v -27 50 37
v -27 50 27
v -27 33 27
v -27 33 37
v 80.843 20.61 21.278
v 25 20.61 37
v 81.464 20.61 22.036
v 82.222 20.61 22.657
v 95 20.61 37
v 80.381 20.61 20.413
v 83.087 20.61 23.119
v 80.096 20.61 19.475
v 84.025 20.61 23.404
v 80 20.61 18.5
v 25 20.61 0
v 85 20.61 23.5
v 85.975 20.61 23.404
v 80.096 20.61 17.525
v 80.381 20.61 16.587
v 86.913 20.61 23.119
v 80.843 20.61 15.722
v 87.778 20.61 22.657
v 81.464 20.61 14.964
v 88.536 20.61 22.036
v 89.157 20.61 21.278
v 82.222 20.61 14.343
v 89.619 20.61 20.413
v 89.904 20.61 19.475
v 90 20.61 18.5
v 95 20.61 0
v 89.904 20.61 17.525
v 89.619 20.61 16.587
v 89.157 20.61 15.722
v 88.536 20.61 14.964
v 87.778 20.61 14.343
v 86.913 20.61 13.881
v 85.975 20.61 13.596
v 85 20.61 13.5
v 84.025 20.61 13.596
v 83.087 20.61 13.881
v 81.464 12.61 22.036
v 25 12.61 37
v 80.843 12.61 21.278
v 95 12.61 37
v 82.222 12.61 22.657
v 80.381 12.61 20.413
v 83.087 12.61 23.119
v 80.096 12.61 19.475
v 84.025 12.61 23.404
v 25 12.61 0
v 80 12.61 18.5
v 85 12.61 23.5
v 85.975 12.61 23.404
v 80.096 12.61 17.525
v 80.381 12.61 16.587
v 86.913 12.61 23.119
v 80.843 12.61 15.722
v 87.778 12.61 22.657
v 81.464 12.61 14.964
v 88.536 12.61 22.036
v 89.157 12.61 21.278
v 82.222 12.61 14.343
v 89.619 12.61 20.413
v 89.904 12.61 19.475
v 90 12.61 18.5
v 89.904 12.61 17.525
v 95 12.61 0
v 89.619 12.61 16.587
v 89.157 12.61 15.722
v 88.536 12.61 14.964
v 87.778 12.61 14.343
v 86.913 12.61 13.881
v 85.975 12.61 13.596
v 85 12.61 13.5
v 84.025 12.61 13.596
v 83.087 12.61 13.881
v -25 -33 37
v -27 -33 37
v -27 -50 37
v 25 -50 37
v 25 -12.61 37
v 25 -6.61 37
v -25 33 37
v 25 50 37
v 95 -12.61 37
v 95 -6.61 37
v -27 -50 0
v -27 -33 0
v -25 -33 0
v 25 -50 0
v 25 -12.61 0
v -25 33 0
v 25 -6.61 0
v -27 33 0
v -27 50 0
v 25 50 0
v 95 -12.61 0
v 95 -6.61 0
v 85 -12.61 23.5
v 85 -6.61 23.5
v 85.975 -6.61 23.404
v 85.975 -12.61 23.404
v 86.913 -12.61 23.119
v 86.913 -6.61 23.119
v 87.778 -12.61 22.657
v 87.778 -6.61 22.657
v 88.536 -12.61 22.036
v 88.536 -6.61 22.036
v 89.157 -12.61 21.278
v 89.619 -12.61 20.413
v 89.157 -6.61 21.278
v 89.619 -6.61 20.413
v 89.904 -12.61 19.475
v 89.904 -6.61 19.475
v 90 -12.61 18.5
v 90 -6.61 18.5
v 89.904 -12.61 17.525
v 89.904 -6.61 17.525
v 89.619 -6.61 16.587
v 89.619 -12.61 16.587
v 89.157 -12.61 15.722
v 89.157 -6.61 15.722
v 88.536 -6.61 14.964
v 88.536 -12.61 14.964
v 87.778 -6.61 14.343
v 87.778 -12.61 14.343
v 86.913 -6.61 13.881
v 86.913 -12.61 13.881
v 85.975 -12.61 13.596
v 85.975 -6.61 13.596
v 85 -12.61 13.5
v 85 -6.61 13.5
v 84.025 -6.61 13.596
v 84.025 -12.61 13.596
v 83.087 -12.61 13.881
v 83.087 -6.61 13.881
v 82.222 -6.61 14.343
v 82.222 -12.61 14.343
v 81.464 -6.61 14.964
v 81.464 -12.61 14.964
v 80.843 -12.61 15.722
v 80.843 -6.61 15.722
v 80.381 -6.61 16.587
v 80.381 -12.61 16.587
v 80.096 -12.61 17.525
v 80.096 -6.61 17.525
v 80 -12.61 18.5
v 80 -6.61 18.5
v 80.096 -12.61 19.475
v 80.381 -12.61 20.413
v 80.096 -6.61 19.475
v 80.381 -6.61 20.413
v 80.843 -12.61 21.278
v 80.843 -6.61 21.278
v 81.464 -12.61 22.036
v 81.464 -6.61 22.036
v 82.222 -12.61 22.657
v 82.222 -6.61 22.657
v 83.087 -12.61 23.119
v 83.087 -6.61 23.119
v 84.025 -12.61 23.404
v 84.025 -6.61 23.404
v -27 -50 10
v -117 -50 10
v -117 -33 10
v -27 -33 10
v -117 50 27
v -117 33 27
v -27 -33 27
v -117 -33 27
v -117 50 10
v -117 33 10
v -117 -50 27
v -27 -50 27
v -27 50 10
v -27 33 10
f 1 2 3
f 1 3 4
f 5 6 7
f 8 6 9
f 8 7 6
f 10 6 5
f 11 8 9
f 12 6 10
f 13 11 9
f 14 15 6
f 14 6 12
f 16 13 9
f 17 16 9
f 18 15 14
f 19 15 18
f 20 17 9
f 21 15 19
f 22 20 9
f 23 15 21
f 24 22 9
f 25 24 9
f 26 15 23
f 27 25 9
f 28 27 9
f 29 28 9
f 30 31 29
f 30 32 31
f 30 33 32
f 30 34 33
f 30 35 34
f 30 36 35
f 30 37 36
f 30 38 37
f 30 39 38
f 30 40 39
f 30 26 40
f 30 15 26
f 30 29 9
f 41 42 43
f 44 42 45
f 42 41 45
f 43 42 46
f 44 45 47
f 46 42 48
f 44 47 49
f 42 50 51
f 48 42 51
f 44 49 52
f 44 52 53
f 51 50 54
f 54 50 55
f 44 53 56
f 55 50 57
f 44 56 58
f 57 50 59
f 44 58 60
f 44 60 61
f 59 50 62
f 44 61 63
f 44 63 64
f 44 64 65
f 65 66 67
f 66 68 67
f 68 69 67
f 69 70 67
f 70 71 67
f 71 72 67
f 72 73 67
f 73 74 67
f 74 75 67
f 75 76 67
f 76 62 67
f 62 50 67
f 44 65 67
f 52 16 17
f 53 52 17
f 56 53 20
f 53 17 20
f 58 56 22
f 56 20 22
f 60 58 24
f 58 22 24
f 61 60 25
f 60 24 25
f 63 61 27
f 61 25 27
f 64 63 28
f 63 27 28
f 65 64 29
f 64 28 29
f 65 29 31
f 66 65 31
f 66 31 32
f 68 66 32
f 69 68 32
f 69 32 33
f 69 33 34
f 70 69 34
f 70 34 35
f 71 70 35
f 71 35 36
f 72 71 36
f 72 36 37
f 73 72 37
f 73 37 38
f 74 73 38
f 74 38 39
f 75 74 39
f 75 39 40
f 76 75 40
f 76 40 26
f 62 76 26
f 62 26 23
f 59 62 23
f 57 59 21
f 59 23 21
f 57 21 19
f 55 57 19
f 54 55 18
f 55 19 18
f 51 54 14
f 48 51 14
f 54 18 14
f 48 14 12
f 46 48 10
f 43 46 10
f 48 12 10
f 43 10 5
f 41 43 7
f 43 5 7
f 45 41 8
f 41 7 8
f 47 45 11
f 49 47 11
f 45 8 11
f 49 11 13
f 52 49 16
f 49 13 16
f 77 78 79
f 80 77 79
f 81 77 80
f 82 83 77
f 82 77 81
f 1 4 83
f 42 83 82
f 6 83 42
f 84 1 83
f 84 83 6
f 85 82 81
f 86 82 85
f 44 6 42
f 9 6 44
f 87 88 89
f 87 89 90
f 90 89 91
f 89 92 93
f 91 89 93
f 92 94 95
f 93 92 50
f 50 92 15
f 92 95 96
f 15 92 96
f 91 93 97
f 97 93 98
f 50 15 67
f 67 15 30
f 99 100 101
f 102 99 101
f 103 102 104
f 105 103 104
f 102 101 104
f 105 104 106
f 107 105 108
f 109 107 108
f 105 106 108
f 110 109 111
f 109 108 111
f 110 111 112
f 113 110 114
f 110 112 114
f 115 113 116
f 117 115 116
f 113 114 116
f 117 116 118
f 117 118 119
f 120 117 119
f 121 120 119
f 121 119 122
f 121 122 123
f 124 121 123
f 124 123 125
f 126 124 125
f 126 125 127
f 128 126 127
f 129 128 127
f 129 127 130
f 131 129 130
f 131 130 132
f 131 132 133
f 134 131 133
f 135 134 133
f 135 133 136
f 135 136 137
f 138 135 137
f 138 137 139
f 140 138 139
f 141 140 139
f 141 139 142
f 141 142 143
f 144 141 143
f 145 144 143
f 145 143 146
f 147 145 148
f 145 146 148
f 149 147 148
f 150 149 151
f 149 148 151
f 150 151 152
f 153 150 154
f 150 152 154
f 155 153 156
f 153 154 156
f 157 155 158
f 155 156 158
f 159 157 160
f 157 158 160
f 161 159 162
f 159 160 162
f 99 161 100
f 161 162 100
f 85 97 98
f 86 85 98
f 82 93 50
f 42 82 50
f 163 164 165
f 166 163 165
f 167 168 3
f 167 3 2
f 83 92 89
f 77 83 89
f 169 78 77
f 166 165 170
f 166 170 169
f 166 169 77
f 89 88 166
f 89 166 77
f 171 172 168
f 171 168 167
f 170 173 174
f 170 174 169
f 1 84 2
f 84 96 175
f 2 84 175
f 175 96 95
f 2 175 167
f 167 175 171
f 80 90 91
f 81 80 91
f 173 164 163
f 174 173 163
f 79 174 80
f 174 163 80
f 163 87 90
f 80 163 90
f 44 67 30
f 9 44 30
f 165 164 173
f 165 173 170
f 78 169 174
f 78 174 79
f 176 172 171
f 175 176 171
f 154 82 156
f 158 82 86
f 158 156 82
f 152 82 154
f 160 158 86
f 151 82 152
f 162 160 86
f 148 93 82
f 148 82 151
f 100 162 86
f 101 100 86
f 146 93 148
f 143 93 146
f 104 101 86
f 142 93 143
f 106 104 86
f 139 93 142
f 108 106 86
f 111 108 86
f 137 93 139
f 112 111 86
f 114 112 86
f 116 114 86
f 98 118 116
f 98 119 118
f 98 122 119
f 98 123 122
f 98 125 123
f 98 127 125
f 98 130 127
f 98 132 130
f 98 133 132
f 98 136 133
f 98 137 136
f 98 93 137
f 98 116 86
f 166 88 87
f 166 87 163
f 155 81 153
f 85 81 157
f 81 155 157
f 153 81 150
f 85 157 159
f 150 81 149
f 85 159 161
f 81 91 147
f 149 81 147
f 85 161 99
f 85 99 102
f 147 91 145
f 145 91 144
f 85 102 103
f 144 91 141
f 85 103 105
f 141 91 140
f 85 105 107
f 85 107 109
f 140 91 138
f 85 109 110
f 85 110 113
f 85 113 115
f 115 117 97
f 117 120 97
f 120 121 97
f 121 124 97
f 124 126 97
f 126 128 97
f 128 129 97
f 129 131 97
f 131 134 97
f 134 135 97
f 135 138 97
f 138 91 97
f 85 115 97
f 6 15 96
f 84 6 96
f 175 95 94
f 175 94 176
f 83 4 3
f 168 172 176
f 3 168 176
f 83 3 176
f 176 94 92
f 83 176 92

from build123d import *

# Parameters (mm, degrees)
SKETCH_1_W          = 92
SKETCH_1_H          = 17
SKETCH_1_W_2        = 70
SKETCH_1_H_2        = 8
SKETCH_1_H_3        = 6
EXTRUDE_1_DEPTH     = 37
SKETCH_2_R          = 5
CUT_EXTRUDE_1_DEPTH = 142.57603411
SKETCH_3_W          = 10
SKETCH_3_H          = 17
CUT_EXTRUDE_2_DEPTH = 90


with BuildPart() as part:
    # 草图1 → 凸台-拉伸1 (new body)
    with BuildSketch(Plane.XY):
        with Locations((-71, 41.5)):
            Rectangle(SKETCH_1_W, SKETCH_1_H)
        with Locations((-71, -41.5)):
            Rectangle(SKETCH_1_W, SKETCH_1_H)
        with Locations((60, 16.610009448)):
            Rectangle(SKETCH_1_W_2, SKETCH_1_H_2)
        with Locations((60, -9.610009448)):
            Rectangle(SKETCH_1_W_2, SKETCH_1_H_3)
        Polygon((25, 50), (-25, 50), (-25, 33), (-25, -33), (-25, -50), (25, -50), (25, -12.610009448), (25, -6.610009448), (25, 12.610009448), (25, 20.610009448), align=None)
    extrude(amount=EXTRUDE_1_DEPTH)

    # 草图2 → 切除-拉伸1 (cut, through all)
    with BuildSketch(Plane(origin=(0, 20.610009448, 0), x_dir=(1, 0, 0), z_dir=(0, 1, 0))):
        with Locations(Location((85, -18.5, 0), (0, 0, 270))):
            Circle(SKETCH_2_R)
    extrude(amount=-CUT_EXTRUDE_1_DEPTH, mode=Mode.SUBTRACT)

    # 草图3 → 切除-拉伸2 (cut)
    with BuildSketch(Plane.ZY.offset(117)):
        with Locations((5, -41.5)):
            Rectangle(SKETCH_3_W, SKETCH_3_H)
        with Locations((32, -41.5)):
            Rectangle(SKETCH_3_W, SKETCH_3_H)
        with Locations((32, 41.5)):
            Rectangle(SKETCH_3_W, SKETCH_3_H)
        with Locations((5, 41.5)):
            Rectangle(SKETCH_3_W, SKETCH_3_H)
    extrude(amount=-CUT_EXTRUDE_2_DEPTH, mode=Mode.SUBTRACT)


solid = part.part
